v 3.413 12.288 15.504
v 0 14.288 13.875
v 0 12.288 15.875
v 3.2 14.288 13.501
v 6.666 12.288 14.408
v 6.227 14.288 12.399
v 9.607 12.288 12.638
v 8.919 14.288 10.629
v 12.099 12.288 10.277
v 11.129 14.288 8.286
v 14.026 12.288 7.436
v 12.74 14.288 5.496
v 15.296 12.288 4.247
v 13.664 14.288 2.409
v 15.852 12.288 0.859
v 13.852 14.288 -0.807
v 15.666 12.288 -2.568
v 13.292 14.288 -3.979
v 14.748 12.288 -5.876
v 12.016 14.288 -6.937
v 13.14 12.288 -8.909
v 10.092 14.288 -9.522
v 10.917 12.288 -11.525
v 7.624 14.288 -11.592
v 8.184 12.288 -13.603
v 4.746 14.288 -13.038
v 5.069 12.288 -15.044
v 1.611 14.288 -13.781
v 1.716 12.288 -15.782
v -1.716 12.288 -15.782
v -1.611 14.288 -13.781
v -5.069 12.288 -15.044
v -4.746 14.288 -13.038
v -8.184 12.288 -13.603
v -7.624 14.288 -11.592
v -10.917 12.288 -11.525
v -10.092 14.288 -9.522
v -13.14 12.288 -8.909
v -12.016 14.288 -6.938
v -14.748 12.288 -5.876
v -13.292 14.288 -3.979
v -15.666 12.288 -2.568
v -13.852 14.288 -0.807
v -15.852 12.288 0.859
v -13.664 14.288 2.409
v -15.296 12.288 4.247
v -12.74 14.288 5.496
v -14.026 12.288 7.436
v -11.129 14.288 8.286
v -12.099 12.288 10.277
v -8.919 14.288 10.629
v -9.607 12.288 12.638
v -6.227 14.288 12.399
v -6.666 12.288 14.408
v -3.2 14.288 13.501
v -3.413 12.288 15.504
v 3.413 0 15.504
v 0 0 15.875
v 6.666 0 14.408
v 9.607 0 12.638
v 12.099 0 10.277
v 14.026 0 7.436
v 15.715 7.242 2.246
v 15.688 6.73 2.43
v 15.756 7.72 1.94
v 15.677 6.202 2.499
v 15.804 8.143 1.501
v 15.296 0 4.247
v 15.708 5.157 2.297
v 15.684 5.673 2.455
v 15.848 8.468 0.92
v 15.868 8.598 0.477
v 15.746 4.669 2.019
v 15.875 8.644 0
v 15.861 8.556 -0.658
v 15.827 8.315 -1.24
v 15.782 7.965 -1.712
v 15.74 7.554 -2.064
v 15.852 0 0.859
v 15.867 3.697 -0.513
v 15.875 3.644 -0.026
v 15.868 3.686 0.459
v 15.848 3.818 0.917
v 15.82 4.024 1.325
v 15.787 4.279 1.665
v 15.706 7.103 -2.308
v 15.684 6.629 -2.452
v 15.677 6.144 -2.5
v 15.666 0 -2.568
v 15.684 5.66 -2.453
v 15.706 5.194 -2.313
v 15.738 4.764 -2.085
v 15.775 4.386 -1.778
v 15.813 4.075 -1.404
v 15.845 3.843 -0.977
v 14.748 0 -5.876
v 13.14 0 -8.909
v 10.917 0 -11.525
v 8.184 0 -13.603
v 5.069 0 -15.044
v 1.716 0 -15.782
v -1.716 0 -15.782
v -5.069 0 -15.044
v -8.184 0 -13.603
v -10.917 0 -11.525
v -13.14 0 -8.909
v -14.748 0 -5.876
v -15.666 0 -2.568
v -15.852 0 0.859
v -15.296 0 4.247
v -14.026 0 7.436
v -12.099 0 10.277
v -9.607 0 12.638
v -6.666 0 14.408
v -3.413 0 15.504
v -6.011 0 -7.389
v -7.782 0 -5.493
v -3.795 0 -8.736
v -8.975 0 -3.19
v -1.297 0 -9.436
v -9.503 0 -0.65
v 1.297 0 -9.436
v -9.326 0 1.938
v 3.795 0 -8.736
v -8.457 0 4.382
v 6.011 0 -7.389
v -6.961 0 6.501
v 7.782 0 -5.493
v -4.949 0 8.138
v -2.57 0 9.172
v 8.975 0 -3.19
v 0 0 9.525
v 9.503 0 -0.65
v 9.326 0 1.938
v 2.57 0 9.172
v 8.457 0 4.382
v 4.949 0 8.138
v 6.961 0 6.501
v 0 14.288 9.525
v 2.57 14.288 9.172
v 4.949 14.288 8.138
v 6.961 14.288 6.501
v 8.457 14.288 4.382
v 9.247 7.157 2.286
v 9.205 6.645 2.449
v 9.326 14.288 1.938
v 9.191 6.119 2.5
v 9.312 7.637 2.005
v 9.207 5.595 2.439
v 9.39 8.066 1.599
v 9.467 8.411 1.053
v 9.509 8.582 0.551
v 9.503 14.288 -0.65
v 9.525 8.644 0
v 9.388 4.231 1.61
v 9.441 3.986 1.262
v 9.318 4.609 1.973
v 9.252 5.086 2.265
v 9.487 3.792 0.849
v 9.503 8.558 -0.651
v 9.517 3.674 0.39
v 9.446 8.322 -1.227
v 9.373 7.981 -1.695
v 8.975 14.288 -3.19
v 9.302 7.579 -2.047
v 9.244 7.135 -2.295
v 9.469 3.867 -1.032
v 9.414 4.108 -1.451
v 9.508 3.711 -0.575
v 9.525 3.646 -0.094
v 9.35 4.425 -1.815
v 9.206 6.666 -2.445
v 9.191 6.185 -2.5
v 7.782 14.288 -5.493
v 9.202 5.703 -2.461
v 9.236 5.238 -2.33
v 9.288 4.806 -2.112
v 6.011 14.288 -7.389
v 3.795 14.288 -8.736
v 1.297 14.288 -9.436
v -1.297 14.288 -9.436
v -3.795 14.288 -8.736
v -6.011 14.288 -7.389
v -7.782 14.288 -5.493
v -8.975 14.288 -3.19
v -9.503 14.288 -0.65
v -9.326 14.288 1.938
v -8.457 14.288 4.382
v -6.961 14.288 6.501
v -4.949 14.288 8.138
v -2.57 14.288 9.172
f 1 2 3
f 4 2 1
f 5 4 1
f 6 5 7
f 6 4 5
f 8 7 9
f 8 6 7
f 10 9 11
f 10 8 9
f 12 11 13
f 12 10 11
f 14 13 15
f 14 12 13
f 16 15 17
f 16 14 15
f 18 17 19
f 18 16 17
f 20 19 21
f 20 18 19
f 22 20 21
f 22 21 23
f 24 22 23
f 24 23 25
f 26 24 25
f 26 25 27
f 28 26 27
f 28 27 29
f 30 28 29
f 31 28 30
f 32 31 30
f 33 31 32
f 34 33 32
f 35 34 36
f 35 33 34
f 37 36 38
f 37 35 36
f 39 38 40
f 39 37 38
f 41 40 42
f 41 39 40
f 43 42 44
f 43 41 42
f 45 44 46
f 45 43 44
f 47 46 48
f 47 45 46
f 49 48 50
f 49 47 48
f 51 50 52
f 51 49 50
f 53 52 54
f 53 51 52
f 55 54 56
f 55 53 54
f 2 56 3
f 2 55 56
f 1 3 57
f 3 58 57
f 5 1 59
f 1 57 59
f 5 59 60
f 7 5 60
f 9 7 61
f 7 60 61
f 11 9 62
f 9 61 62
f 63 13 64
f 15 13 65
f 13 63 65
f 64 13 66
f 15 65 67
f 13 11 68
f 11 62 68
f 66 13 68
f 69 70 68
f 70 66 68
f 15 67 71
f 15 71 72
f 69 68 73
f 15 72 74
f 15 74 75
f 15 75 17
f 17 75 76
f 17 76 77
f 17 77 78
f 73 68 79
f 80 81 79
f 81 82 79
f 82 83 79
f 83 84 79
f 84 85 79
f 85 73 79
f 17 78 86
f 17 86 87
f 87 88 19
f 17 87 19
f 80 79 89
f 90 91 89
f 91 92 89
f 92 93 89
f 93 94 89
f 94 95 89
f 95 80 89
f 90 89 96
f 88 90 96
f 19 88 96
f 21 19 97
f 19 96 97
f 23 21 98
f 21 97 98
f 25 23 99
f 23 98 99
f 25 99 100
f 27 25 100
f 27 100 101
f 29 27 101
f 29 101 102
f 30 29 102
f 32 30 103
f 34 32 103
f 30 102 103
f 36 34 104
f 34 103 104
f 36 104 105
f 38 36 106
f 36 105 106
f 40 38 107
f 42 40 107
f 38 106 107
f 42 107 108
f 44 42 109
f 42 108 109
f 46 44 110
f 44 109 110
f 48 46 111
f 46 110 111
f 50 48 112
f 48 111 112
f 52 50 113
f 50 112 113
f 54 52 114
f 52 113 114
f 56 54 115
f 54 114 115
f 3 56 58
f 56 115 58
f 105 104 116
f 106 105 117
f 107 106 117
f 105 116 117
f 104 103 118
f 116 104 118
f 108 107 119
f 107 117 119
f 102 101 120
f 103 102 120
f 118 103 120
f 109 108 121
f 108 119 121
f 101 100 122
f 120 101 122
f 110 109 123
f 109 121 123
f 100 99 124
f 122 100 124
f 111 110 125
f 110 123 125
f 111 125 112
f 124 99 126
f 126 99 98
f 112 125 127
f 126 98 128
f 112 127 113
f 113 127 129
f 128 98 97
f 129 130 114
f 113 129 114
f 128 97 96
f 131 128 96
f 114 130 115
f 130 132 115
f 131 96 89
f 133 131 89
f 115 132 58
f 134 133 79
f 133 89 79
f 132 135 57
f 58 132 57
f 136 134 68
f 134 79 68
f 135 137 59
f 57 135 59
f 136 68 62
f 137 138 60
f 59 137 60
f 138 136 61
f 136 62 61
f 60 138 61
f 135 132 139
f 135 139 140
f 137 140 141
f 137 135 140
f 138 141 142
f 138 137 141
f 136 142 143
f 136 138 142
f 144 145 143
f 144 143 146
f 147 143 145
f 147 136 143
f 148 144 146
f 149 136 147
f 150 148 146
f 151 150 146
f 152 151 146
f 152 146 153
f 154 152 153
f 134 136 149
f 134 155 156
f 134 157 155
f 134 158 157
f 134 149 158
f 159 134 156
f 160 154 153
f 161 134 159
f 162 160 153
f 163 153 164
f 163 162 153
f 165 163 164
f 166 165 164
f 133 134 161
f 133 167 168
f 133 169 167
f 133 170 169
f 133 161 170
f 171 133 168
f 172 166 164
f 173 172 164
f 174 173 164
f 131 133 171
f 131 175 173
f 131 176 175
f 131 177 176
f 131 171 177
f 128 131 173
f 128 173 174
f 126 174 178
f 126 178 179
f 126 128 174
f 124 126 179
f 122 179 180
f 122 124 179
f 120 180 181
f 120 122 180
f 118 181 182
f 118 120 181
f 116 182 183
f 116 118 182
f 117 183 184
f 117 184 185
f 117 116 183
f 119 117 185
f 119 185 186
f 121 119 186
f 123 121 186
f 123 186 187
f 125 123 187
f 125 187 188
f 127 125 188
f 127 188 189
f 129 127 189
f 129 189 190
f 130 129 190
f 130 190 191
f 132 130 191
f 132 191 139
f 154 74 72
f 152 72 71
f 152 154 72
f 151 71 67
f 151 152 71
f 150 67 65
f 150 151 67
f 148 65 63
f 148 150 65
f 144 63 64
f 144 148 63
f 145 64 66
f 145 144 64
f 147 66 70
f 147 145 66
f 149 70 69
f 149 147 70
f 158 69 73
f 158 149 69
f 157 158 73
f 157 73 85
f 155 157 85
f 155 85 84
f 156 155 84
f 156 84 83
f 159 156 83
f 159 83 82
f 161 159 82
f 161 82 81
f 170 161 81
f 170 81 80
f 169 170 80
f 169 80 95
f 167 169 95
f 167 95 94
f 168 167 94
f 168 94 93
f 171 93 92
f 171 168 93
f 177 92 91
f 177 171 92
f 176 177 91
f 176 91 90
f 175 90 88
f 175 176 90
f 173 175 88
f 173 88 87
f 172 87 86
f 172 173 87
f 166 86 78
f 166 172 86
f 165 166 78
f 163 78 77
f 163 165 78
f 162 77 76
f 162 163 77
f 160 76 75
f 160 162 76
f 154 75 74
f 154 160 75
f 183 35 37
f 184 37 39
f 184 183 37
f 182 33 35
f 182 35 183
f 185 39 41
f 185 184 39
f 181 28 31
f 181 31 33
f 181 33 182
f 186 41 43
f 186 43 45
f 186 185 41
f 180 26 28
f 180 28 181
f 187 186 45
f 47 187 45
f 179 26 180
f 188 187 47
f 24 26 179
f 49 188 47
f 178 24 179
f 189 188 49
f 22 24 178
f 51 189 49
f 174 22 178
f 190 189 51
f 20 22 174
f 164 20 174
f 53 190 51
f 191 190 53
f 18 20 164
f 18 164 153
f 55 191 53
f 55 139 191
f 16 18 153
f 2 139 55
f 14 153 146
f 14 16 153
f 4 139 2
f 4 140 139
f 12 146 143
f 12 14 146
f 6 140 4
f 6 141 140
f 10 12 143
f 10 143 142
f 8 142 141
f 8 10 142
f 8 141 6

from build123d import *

# Parameters (mm, degrees)
SKETCH1_R              = 15.875
SKETCH1_R_2            = 9.525
BOSS_EXTRUDE1_DEPTH    = 14.2875
CHAMFER1_SIZE          = 2
CUT_EXTRUDE1_START     = 9.191062133
CUT_EXTRUDE1_OUTLINE_R = 2.5
CUT_EXTRUDE1_DEPTH     = 6.683937969


# Read off the part's stored shape, not the designer's step: Cut-Extrude1
with BuildPart() as part:
    # Sketch1 → Boss-Extrude1 (new body)
    with BuildSketch(Plane(origin=(0, 0, 0), x_dir=(1, 0, 0), z_dir=(0, 1, 0))):
        with Locations(Location((0, 0, 0), (0, 0, 270))):
            Circle(SKETCH1_R)
        with Locations(Location((0, 0, 0), (0, 0, 270))):
            Circle(SKETCH1_R_2, mode=Mode.SUBTRACT)
    extrude(amount=BOSS_EXTRUDE1_DEPTH)

    # Chamfer1
    chamfer1_edges = [part.edges().sort_by_distance(p)[0] for p in [
        (0, 14.2875, -15.875),
    ]]
    chamfer(chamfer1_edges, length=CHAMFER1_SIZE)

    # Cut-Extrude1 outline → Cut-Extrude1 (cut)
    with BuildSketch(Plane.YZ.offset(CUT_EXTRUDE1_START)):
        with Locations((6.14375, 0)):
            Circle(CUT_EXTRUDE1_OUTLINE_R)
    extrude(amount=CUT_EXTRUDE1_DEPTH, mode=Mode.SUBTRACT)


solid = part.part
